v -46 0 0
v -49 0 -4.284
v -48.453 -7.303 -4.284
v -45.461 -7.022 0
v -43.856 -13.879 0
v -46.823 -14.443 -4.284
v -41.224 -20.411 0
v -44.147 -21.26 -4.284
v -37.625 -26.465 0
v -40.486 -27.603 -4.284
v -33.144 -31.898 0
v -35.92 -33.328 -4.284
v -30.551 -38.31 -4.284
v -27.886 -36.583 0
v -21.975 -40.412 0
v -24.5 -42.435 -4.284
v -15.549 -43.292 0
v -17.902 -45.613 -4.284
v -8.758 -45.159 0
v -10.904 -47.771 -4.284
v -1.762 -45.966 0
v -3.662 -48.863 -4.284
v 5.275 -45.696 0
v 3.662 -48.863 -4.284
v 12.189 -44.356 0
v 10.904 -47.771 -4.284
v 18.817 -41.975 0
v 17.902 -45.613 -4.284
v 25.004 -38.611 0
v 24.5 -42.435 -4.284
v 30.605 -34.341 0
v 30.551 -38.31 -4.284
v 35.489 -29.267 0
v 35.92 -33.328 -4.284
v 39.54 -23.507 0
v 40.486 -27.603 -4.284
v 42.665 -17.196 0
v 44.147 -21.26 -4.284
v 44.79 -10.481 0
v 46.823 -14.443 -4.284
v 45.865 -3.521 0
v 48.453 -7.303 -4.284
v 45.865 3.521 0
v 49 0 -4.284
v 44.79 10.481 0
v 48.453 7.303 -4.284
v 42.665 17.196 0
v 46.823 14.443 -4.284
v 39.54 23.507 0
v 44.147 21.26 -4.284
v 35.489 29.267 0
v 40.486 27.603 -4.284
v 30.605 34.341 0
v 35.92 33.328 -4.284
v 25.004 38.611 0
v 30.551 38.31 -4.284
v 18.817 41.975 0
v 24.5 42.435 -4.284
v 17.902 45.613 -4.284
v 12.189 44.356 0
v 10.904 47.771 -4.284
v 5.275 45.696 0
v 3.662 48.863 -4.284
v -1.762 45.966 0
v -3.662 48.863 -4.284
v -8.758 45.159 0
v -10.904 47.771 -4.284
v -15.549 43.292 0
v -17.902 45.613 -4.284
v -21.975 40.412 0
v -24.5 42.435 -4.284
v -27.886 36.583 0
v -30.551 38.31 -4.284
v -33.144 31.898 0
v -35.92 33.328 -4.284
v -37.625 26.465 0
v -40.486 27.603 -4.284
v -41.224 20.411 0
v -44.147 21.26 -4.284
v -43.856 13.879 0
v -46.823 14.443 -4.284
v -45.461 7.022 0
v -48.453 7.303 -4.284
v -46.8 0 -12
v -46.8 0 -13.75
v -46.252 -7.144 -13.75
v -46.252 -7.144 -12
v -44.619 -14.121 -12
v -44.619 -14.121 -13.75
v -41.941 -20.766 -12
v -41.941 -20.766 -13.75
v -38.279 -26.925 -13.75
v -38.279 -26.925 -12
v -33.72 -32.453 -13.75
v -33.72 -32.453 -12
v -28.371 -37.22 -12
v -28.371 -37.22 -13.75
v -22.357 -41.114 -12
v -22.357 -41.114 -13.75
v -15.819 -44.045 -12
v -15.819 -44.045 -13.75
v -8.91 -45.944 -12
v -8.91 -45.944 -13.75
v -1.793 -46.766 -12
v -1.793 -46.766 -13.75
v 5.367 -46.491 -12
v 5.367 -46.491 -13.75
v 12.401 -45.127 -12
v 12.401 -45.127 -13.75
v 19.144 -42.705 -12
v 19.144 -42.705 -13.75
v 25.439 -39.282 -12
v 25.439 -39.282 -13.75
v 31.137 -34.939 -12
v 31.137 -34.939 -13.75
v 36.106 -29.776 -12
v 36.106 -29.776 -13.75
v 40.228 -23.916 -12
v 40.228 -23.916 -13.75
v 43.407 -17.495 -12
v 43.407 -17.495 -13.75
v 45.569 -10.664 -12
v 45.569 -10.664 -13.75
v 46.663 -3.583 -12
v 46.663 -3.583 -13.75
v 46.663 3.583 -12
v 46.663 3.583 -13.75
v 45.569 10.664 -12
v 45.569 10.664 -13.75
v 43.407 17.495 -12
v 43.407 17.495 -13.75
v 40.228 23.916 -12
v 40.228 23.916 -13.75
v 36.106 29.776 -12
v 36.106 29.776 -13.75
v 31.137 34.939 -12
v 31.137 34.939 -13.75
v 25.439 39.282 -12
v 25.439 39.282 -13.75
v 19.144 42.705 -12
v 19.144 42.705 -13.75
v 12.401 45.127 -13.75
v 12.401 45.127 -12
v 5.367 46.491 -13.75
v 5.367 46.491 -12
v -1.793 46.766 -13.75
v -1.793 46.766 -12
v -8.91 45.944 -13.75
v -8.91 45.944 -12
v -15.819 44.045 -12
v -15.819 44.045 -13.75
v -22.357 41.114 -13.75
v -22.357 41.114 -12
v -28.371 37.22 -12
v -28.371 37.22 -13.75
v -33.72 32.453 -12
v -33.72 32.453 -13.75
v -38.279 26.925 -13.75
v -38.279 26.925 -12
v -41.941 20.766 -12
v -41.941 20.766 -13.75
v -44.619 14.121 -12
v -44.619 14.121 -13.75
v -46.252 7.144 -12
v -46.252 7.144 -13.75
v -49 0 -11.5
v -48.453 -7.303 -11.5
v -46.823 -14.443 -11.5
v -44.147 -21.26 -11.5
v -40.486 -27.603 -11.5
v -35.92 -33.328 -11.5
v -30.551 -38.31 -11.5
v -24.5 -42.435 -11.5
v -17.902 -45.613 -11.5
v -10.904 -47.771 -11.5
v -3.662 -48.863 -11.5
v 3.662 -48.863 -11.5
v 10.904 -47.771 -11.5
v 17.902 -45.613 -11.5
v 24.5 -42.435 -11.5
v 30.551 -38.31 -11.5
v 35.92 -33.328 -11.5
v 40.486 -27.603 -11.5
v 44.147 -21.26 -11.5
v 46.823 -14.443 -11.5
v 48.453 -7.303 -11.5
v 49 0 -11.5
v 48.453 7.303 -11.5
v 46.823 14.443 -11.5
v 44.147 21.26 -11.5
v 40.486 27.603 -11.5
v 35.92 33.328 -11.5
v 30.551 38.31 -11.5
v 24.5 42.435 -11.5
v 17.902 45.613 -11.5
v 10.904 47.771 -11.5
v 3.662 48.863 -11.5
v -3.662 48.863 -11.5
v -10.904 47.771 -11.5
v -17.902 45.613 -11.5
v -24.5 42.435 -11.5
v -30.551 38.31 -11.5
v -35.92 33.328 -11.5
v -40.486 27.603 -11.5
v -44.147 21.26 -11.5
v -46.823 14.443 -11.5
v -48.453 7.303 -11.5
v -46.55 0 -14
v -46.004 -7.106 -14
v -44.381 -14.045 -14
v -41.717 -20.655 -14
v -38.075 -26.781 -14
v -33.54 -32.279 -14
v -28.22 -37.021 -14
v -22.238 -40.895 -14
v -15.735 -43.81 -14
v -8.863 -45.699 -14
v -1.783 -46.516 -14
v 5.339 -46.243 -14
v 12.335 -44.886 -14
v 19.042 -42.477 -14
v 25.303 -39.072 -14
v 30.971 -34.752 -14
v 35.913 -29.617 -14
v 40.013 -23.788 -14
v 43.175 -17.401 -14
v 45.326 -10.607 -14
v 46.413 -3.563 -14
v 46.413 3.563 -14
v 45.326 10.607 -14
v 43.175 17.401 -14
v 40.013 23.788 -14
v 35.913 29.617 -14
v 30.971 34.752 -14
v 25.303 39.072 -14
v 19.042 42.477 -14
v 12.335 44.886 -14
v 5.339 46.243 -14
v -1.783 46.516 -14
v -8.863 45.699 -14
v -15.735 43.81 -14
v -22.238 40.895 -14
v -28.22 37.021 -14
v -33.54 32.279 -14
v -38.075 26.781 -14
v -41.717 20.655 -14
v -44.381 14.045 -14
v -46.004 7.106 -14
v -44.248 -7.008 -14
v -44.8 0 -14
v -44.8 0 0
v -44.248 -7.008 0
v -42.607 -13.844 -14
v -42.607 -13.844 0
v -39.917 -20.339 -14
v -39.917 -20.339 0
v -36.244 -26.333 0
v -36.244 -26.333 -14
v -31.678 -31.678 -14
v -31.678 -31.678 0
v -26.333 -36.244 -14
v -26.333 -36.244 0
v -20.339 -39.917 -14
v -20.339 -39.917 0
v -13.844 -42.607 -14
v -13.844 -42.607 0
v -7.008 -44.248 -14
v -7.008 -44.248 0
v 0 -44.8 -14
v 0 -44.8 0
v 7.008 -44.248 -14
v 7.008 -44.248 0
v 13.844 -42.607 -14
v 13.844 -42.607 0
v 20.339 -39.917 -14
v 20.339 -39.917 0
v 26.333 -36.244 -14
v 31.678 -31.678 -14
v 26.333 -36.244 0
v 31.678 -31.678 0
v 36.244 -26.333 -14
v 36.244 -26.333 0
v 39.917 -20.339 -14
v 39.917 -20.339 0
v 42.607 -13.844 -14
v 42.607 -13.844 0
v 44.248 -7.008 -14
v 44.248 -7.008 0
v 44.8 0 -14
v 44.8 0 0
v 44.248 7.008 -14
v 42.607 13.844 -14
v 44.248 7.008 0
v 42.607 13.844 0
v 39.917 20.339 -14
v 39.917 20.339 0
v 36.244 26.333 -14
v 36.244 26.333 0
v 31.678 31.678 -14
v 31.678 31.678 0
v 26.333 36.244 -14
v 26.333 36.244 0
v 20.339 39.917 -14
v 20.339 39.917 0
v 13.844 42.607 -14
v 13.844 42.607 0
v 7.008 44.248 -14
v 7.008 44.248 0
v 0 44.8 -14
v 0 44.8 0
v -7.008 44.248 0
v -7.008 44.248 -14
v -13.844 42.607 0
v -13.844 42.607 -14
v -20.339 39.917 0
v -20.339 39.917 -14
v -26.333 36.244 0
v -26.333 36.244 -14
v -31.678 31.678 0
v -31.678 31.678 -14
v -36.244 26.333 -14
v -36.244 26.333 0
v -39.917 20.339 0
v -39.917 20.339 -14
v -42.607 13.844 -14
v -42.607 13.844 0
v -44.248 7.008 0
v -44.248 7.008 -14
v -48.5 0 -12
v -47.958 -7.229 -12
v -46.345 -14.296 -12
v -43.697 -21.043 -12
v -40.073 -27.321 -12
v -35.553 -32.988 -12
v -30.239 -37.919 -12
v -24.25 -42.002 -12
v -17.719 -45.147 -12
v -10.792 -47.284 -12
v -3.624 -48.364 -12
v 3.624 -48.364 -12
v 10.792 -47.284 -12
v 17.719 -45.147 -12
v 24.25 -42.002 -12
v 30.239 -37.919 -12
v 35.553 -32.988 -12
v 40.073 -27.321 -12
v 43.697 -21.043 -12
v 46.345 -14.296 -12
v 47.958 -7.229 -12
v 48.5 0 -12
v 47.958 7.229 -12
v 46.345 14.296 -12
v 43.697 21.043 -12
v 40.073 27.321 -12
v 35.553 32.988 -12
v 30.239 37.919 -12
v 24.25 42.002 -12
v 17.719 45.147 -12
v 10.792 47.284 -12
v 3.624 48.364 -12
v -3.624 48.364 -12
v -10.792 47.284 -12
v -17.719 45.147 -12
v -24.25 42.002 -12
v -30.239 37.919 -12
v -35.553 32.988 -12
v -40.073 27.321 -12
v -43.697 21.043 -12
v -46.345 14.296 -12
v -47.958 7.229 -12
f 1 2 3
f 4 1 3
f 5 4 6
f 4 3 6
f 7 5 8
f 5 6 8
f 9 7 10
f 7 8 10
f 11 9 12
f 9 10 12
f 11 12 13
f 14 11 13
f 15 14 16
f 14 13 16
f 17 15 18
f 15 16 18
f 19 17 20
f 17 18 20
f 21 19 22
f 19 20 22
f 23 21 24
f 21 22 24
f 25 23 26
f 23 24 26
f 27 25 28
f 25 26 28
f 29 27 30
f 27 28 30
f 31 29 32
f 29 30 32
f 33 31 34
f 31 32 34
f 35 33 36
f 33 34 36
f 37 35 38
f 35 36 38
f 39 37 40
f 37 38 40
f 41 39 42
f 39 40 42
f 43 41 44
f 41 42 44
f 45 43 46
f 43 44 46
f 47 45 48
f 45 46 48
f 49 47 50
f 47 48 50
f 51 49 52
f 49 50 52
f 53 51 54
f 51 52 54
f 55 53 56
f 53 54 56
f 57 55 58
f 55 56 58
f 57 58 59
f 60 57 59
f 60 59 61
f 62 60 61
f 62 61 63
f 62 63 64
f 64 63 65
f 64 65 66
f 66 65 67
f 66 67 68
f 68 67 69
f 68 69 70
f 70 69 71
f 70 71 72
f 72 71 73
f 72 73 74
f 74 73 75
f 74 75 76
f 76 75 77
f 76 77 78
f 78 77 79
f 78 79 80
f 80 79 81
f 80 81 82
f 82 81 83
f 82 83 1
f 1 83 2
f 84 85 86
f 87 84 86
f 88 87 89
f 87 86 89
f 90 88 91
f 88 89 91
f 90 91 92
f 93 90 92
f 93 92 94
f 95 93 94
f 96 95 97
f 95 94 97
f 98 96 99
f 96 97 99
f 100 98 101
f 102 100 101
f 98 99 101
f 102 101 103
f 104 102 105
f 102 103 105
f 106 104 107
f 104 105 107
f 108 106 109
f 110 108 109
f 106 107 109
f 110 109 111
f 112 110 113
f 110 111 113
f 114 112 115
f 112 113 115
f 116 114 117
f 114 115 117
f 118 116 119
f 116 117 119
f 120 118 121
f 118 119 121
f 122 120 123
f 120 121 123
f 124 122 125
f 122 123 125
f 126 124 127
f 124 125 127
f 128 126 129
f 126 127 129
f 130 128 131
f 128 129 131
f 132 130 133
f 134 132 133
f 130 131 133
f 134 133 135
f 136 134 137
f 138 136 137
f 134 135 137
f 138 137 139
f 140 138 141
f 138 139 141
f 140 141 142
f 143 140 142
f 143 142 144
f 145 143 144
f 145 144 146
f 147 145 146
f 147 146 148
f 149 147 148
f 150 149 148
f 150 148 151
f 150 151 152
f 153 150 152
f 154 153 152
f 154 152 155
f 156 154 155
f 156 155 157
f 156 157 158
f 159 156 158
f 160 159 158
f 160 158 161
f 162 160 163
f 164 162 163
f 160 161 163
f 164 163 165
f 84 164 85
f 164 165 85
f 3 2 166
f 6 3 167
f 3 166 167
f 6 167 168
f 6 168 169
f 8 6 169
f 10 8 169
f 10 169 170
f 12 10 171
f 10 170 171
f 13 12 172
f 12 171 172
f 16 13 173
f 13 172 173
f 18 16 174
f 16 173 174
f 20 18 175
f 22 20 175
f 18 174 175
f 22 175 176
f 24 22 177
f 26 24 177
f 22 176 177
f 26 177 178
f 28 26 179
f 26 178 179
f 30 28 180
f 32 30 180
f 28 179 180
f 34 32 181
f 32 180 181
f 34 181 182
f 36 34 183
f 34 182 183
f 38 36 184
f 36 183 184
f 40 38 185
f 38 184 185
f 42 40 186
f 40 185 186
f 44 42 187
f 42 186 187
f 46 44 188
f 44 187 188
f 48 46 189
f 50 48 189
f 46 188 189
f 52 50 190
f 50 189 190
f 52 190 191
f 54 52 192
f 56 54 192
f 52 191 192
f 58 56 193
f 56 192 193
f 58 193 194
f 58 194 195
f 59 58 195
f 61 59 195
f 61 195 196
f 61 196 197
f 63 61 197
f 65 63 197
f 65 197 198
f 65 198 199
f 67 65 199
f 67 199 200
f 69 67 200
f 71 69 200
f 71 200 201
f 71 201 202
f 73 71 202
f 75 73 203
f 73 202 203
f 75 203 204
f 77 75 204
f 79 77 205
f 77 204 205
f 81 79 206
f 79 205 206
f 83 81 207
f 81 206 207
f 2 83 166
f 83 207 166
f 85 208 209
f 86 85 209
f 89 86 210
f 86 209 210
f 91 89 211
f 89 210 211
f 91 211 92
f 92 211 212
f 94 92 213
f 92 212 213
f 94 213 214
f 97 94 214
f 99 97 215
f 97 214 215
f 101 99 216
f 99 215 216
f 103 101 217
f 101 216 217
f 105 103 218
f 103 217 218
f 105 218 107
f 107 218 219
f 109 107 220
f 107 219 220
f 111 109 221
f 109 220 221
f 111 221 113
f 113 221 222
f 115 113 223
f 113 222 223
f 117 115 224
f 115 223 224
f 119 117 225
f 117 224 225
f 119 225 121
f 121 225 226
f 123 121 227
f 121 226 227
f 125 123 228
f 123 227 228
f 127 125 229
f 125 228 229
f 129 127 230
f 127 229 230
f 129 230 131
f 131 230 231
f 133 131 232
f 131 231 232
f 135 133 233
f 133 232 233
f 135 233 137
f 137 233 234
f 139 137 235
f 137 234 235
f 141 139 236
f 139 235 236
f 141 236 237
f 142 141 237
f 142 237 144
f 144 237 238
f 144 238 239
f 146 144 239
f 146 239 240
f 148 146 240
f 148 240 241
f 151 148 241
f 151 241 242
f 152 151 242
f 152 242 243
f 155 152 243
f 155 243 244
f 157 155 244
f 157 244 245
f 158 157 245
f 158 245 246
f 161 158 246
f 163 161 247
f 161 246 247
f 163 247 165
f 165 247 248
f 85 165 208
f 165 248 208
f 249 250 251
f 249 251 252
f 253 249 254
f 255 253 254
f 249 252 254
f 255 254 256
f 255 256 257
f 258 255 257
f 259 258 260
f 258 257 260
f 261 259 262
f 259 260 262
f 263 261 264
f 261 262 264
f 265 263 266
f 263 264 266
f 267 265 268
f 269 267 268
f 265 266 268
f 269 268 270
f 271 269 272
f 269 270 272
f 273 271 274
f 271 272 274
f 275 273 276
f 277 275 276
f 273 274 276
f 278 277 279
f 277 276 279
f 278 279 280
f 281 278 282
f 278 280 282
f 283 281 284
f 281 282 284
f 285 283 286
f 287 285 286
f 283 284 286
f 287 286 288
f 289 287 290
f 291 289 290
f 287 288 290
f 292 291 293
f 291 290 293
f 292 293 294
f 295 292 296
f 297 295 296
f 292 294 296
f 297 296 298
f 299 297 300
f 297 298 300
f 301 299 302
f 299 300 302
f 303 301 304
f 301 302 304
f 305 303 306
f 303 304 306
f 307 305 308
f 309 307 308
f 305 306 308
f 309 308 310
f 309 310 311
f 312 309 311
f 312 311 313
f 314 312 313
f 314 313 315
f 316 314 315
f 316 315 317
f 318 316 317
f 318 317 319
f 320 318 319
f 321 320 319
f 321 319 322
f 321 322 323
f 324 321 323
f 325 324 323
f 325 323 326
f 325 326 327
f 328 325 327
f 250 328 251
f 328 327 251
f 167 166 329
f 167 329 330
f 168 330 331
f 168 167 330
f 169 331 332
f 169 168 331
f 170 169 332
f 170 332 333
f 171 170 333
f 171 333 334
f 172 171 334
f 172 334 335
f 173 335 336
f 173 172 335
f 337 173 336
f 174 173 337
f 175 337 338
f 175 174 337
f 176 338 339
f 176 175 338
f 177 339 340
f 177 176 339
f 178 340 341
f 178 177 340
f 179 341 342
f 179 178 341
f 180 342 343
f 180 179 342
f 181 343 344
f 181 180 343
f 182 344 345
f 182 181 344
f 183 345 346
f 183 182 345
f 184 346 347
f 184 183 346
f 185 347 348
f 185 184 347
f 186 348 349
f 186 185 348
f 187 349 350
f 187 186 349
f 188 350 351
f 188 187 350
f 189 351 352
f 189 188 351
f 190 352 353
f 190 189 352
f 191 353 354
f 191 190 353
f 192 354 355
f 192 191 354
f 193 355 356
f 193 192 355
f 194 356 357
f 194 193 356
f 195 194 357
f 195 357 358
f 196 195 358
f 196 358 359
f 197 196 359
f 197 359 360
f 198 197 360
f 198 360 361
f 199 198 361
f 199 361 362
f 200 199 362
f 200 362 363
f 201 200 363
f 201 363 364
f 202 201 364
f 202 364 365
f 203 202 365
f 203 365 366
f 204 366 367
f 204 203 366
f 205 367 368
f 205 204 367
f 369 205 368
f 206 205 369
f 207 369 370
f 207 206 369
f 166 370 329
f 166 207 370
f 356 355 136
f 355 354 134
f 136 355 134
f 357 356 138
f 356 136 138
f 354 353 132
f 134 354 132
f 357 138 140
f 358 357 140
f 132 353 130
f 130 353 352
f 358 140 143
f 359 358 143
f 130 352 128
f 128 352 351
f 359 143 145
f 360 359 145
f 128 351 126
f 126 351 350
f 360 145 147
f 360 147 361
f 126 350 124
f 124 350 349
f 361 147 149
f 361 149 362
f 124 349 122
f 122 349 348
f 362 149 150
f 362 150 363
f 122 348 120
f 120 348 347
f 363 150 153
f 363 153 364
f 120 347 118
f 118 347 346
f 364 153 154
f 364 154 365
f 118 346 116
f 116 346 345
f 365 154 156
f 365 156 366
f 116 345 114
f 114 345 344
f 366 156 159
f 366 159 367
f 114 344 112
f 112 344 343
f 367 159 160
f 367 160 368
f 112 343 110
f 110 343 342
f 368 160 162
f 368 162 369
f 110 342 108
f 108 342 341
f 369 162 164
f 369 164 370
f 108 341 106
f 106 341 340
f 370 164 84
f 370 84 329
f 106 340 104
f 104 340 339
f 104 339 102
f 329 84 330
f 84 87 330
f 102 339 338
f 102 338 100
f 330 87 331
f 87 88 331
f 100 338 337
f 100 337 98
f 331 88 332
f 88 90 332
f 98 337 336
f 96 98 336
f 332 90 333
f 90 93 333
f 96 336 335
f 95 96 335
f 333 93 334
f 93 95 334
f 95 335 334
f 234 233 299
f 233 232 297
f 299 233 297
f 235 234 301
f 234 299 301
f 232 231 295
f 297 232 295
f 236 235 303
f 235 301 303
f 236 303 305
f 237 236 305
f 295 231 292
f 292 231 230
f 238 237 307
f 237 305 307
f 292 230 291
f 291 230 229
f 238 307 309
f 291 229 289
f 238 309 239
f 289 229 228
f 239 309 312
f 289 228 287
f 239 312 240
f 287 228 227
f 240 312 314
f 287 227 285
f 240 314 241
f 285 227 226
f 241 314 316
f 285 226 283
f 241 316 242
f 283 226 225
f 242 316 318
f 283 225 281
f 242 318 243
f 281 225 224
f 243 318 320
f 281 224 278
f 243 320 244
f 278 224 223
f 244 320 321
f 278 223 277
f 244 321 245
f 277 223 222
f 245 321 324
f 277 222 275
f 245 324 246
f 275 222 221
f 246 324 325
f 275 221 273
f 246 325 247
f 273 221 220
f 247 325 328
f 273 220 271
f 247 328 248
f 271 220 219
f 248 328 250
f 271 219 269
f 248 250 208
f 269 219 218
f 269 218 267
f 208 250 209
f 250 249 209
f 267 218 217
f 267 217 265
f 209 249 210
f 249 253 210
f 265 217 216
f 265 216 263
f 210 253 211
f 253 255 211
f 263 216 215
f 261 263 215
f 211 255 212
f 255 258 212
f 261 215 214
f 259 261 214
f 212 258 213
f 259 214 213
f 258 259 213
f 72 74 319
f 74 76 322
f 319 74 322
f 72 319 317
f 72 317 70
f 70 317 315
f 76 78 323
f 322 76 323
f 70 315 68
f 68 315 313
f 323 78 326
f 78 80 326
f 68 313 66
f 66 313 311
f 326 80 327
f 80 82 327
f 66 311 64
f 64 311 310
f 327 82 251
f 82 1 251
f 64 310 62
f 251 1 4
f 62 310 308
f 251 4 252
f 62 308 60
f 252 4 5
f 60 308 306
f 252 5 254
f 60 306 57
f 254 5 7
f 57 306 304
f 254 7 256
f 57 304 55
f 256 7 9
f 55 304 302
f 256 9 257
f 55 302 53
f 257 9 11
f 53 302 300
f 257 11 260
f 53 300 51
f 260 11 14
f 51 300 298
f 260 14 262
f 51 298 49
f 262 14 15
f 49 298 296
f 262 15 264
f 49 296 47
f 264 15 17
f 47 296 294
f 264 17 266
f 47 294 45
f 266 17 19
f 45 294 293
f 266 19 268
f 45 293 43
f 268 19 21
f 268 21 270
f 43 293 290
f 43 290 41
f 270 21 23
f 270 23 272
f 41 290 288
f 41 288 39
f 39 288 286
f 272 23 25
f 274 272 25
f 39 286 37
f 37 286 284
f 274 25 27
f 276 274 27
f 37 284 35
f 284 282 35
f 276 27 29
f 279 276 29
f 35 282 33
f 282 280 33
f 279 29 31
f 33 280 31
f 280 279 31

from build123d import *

# Parameters (mm, degrees)
CHAMFER1_SIZE  = 0.25
CHAMFER2_SIZE  = 0.5
CHAMFER3_SIZE  = 3
CHAMFER3_SIZE2 = 4.28444402


with BuildPart() as part:
    # Sketch2 → Revolve1 (revolve)
    with BuildSketch(Plane(origin=(0, 0, 0), x_dir=(1, 0, 0), z_dir=(0, 1, 0)), mode=Mode.PRIVATE) as revolve1_sk:
        Polygon((44.8, 14), (44.8, 0), (49, 0), (49, 12), (46.8, 12), (46.8, 14), align=None)
    revolve(revolve1_sk.sketch.rotate(Axis((0, 0, -51.275510204), (0, 0, 1)), 180), axis=Axis((0, 0, -51.275510204), (0, 0, 1)))

    # Chamfer1
    chamfer1_edges = [part.edges().sort_by_distance(p)[0] for p in [
        (46.8, 0, -14),
    ]]
    chamfer(chamfer1_edges, length=CHAMFER1_SIZE)

    # Chamfer2
    chamfer2_edges = [part.edges().sort_by_distance(p)[0] for p in [
        (49, 0, -12),
    ]]
    chamfer(chamfer2_edges, length=CHAMFER2_SIZE)

    # Chamfer3
    chamfer3_edges = [part.edges().sort_by_distance(p)[0] for p in [
        (49, 0, 0),
    ]]
    chamfer3_side = [part.faces().sort_by_distance(p)[0] for p in [
        (46.185929291, 0, 0),
    ]]
    chamfer(chamfer3_edges, length=CHAMFER3_SIZE, length2=CHAMFER3_SIZE2, reference=chamfer3_side[0])


solid = part.part
